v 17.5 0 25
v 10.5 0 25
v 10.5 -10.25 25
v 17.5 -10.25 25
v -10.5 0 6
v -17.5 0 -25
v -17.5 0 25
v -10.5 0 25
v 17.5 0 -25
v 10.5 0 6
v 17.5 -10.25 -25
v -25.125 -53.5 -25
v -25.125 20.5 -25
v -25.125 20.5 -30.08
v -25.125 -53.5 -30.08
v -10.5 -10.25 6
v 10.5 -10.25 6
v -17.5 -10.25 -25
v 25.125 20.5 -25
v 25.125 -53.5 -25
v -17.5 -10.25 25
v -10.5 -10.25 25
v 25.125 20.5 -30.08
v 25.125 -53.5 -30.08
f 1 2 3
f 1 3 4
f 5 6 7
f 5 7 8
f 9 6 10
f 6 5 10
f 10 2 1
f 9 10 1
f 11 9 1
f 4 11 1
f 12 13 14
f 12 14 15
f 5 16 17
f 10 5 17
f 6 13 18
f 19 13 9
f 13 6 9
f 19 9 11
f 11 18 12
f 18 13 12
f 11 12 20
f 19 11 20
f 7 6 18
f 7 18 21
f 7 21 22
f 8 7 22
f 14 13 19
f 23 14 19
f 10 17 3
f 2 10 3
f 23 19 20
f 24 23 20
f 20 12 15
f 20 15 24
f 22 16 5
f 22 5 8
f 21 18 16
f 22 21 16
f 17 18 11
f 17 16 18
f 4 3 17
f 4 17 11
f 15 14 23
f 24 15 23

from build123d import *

# Parameters (mm, degrees)
F0_W     = 35
F0_H     = 50
F1_DEPTH = 10.25
F2_W     = 21
F2_H     = 19
F3_DEPTH = 25
F5_W     = 50.25
F5_H     = 74
F6_DEPTH = 5.08


with BuildPart() as f1:
    # F0 (on Front) → F1 (new body)
    with BuildSketch(Plane.XZ):
        Rectangle(F0_W, F0_H)
    extrude(amount=F1_DEPTH)

    # F2 (on face) → F3 (cut)
    with BuildSketch(Plane.XZ.offset(10.25)):
        with Locations((0, 15.5)):
            Rectangle(F2_W, F2_H)
    extrude(amount=-F3_DEPTH, mode=Mode.SUBTRACT)

    # F5 (on offset) → F6 (join)
    with BuildSketch(Plane(origin=(0, 0, -25), x_dir=(1, 0, 0), z_dir=(0, 0, -1))):
        with Locations((0, 16.5)):
            Rectangle(F5_W, F5_H)
    extrude(amount=F6_DEPTH)


solid = f1.part
